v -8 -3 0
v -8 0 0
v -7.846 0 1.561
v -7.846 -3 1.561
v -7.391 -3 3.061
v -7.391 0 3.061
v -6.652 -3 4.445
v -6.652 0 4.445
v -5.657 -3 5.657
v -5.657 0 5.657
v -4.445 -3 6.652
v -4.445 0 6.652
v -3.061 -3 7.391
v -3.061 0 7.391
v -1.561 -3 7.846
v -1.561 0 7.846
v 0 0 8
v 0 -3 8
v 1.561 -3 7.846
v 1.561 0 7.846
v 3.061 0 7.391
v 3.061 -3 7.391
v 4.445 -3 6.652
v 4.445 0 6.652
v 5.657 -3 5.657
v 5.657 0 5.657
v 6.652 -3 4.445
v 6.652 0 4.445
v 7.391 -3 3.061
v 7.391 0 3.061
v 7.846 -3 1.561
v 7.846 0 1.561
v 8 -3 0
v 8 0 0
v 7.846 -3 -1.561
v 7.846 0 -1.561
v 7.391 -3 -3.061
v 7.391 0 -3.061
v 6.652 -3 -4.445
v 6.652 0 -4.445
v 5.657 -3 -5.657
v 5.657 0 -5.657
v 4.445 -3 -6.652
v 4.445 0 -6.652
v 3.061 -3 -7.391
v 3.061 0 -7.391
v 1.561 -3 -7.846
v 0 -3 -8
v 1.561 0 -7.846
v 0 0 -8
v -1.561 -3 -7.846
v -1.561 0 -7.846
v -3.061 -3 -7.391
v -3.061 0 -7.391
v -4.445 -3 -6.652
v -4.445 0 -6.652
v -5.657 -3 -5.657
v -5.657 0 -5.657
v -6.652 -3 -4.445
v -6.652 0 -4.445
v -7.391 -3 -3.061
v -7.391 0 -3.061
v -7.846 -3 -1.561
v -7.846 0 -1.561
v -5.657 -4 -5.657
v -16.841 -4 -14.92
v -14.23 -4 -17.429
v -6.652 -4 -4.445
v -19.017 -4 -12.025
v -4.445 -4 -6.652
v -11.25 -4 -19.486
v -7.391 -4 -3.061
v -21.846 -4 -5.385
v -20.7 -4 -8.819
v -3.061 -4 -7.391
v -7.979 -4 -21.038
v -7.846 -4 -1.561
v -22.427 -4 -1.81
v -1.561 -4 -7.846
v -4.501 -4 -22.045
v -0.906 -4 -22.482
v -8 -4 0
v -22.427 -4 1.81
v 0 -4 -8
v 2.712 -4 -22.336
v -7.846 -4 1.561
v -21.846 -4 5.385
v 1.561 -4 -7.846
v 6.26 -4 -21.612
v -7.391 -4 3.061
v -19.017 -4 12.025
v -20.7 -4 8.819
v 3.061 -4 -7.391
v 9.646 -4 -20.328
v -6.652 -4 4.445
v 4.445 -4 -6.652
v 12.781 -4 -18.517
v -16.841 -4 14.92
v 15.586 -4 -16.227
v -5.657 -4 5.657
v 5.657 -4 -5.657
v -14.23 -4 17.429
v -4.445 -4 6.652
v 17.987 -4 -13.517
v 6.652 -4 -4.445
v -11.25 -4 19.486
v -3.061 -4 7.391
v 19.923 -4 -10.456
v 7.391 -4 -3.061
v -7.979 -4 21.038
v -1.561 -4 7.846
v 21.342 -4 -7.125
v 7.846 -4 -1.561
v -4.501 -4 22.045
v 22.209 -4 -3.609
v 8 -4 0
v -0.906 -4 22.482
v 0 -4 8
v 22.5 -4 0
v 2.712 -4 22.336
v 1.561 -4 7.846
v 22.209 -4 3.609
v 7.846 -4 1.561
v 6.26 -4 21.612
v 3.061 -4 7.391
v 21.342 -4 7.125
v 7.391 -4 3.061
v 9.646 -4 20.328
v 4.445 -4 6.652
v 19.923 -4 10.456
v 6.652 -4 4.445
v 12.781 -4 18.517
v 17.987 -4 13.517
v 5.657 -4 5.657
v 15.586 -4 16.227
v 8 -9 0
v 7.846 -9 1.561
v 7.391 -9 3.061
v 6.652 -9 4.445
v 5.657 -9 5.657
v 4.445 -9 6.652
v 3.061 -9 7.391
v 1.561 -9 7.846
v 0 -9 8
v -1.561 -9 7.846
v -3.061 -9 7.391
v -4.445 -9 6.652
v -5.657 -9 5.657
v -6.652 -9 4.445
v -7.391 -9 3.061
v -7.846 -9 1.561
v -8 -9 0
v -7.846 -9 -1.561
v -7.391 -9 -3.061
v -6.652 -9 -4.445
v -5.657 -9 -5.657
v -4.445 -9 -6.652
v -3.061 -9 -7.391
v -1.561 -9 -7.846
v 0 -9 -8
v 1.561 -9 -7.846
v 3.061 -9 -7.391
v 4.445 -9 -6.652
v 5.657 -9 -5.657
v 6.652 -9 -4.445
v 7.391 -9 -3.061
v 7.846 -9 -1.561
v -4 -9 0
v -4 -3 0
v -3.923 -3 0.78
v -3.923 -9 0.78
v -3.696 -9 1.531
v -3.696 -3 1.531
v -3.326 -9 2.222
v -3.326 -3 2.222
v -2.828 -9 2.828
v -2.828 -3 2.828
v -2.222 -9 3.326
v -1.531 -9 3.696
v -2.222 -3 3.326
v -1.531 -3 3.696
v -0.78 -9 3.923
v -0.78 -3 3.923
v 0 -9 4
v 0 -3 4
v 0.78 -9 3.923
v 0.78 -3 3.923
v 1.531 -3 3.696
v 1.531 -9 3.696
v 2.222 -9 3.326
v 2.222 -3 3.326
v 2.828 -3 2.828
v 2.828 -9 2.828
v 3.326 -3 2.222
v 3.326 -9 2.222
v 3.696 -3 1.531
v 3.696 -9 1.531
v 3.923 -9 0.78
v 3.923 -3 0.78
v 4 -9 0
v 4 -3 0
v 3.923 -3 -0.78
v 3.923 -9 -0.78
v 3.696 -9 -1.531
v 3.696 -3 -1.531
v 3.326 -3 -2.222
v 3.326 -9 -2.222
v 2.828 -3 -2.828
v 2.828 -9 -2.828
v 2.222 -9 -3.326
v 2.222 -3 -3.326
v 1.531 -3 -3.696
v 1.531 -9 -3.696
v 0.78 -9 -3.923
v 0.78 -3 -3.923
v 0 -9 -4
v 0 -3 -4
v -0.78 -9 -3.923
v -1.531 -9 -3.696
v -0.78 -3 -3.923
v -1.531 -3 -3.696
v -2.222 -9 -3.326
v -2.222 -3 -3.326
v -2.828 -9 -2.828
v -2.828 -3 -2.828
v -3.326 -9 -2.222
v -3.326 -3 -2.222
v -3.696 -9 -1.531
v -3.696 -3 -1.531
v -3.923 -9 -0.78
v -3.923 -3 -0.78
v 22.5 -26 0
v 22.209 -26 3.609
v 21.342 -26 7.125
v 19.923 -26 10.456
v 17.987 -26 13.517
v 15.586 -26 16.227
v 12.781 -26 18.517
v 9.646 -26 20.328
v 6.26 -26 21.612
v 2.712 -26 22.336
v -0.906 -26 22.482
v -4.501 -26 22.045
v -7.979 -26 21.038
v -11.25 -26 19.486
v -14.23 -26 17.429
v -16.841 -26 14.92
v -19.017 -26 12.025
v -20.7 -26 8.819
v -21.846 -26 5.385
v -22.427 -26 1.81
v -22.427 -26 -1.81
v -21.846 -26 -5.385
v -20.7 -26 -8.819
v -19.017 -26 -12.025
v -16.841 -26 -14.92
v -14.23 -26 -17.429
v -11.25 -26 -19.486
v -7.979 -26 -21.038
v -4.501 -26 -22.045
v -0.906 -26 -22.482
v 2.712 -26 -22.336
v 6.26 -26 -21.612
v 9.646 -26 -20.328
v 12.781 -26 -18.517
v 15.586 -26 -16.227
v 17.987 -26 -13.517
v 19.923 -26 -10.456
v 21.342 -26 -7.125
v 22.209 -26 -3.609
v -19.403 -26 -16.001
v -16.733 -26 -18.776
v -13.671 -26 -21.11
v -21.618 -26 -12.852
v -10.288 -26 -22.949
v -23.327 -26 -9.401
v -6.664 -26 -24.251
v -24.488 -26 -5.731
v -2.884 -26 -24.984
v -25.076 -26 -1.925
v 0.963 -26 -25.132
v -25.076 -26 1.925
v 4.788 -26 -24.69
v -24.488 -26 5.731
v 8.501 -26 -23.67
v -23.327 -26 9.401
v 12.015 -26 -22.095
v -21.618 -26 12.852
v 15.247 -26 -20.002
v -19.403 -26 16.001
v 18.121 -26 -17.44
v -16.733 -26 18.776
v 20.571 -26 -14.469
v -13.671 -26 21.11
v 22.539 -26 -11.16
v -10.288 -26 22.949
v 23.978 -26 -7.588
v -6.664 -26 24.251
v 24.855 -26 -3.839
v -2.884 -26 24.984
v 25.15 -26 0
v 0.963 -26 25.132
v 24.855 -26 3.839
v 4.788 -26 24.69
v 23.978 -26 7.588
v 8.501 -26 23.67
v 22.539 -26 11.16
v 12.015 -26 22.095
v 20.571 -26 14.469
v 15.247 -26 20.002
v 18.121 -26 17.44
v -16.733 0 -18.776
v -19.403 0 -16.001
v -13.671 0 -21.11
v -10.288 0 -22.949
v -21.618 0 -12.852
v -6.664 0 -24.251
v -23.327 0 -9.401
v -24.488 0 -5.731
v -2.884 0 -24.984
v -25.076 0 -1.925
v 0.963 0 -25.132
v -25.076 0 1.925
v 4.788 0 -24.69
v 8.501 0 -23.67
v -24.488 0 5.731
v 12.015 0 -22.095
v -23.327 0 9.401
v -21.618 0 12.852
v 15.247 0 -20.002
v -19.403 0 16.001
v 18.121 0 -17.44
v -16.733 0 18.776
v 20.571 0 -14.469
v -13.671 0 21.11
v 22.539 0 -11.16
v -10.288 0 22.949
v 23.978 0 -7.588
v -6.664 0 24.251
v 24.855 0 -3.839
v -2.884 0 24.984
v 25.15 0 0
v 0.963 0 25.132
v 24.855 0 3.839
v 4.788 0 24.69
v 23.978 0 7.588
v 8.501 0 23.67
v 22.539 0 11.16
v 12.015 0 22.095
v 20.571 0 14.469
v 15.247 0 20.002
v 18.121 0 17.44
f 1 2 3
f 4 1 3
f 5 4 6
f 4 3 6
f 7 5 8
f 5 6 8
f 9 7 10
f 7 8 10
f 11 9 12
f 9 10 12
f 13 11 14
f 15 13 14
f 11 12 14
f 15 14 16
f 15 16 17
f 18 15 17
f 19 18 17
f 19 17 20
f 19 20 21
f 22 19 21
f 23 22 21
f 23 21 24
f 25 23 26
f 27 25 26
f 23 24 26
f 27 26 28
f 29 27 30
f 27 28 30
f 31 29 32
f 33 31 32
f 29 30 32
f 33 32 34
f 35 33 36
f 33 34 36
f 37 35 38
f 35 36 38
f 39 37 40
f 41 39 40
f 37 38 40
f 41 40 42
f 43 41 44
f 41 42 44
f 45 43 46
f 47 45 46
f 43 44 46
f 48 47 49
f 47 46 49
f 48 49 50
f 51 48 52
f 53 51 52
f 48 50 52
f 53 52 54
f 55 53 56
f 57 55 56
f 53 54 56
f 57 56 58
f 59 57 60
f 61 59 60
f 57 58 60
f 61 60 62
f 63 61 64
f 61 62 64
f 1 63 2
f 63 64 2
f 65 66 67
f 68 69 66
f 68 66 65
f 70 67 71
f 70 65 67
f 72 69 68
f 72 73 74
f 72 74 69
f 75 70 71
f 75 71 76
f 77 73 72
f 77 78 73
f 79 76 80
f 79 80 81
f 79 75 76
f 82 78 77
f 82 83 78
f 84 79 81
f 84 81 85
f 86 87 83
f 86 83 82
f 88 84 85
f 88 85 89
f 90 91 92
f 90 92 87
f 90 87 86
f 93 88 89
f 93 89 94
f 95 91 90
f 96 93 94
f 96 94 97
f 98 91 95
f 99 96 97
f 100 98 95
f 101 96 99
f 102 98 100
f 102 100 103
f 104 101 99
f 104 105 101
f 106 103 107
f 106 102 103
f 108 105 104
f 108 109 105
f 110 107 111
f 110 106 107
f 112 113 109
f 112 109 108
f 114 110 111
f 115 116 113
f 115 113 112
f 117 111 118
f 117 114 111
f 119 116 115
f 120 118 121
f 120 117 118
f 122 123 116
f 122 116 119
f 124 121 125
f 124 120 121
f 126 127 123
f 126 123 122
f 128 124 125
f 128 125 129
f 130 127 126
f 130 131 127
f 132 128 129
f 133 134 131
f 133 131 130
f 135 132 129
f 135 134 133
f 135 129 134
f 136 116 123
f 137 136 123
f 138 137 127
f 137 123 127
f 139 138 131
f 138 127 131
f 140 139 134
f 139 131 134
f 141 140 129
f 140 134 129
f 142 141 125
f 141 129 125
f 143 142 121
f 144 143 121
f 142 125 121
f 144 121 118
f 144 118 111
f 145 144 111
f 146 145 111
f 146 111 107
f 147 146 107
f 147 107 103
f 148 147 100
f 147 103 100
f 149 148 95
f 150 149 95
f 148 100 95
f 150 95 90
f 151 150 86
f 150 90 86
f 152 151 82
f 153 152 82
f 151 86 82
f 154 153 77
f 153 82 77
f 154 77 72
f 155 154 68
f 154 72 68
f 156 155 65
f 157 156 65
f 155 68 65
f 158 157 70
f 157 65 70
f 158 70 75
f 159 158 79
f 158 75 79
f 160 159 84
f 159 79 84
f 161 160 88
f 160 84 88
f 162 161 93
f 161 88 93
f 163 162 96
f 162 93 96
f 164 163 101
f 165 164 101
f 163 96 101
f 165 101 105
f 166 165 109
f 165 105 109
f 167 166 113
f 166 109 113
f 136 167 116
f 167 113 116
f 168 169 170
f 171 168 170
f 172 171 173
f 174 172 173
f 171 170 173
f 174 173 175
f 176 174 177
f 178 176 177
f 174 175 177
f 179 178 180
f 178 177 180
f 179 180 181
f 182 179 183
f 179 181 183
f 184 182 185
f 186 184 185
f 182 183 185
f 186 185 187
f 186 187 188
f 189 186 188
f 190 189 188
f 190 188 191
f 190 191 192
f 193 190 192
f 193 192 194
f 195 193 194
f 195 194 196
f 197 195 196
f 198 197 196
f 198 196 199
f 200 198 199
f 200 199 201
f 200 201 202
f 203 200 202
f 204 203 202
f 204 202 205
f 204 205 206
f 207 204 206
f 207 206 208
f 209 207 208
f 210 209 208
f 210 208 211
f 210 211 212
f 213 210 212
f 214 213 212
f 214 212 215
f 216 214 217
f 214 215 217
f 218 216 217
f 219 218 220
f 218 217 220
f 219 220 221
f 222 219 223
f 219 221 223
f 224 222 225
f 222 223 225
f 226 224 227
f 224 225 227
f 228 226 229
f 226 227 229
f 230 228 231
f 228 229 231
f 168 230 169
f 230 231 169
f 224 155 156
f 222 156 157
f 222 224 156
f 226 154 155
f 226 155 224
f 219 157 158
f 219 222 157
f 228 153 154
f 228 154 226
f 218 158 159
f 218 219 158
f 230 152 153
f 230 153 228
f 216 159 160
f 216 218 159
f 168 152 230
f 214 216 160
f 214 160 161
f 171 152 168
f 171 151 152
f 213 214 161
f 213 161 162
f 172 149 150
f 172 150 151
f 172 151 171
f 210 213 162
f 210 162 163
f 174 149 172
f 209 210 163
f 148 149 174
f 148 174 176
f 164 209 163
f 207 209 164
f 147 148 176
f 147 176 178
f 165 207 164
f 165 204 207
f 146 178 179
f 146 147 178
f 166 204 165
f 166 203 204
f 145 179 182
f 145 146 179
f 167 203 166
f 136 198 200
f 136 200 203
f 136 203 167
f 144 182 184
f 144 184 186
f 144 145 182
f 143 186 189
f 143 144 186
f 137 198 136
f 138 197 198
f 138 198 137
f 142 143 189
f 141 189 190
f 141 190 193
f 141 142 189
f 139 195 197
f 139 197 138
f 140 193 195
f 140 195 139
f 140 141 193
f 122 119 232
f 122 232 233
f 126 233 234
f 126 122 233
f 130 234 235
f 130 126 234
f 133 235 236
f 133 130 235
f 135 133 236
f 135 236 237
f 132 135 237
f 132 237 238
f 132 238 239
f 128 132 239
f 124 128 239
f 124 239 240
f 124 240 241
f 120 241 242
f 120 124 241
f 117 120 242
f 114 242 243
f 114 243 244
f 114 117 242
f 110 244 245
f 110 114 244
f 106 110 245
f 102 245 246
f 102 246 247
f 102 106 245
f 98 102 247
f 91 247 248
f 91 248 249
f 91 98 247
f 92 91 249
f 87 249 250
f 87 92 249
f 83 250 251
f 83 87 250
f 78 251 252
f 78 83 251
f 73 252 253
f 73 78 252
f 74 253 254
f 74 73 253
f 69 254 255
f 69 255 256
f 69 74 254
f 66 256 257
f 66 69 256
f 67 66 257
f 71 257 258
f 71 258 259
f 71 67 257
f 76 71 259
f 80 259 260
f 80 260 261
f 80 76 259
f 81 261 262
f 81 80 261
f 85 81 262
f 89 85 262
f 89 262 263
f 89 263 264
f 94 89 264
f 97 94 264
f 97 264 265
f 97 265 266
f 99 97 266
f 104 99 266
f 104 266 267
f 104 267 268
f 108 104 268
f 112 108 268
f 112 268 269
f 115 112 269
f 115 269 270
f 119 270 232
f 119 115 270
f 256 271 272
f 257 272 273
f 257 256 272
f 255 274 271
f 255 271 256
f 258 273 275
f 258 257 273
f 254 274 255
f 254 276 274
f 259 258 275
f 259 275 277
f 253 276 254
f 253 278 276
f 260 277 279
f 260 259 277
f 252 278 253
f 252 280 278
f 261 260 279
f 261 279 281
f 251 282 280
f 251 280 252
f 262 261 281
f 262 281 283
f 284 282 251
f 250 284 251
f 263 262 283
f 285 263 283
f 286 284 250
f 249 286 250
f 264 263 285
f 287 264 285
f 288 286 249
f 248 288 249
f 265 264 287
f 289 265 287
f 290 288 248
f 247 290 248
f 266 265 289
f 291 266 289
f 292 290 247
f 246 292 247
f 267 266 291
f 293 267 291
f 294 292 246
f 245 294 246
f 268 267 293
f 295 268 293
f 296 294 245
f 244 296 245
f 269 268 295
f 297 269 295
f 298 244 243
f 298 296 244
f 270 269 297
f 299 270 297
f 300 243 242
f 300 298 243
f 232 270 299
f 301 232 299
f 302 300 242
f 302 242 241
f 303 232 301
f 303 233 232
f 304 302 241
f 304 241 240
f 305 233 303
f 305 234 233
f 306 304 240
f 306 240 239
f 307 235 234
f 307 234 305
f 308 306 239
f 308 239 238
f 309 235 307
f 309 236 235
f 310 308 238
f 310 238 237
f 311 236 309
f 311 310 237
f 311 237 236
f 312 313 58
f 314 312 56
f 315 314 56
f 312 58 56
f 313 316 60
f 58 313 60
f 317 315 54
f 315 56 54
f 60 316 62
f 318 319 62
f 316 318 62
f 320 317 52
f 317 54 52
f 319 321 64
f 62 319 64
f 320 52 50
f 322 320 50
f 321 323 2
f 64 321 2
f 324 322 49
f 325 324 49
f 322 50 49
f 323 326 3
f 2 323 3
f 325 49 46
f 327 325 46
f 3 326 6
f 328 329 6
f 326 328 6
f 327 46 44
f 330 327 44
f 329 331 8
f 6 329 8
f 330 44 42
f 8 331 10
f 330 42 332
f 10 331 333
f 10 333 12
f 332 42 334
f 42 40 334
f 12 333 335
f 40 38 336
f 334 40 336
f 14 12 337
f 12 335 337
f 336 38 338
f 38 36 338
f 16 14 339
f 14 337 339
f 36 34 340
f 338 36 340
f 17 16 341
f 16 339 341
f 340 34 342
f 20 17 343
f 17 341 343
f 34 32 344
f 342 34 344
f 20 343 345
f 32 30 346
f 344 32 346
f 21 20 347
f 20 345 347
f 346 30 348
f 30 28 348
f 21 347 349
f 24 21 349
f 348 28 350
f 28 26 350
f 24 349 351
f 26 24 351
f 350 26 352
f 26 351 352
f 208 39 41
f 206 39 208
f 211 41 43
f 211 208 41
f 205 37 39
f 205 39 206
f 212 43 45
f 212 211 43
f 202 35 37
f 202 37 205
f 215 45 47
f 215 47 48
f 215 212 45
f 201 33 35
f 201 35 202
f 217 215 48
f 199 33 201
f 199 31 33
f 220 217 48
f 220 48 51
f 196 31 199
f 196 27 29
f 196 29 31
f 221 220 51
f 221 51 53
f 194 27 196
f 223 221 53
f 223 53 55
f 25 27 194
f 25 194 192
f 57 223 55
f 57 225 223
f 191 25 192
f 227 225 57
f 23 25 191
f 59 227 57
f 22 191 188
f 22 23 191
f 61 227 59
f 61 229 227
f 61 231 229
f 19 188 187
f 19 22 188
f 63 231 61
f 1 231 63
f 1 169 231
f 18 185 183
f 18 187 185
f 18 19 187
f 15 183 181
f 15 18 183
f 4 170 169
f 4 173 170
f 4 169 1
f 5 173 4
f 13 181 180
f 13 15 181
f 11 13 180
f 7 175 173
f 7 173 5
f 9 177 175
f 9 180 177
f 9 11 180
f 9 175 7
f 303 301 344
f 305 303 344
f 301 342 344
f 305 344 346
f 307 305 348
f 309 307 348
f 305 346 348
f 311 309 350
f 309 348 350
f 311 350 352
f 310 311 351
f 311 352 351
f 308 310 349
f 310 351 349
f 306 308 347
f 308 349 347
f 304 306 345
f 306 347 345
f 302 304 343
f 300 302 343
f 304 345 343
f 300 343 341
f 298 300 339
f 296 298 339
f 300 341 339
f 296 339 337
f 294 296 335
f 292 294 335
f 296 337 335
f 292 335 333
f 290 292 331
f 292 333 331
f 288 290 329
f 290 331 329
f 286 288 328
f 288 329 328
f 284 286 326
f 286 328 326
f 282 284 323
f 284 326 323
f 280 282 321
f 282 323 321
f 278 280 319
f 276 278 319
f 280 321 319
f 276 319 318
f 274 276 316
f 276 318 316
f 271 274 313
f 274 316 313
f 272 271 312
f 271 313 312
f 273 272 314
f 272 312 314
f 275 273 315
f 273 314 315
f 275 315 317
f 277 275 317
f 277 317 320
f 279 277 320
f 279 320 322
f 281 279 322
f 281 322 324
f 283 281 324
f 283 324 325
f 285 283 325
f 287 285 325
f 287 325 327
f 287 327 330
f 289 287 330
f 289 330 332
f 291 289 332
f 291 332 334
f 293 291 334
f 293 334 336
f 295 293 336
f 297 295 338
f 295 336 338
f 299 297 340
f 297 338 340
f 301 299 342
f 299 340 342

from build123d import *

# Parameters (mm, degrees)
F0_R     = 25.15
F1_DEPTH = 4
F2_R     = 25.15
F2_R_2   = 22.5
F3_DEPTH = 22
F4_R     = 8
F5_DEPTH = 5
F6_R     = 4
F7_DEPTH = 25
F8_R     = 8
F9_DEPTH = 3


with BuildPart() as f1:
    # F0 (on Front) → F1 (new body)
    with BuildSketch(Plane.XZ):
        Circle(F0_R)
    extrude(amount=F1_DEPTH)

    # F2 (on face) → F3 (join)
    with BuildSketch(Plane.XZ.offset(4)):
        Circle(F2_R)
        Circle(F2_R_2, mode=Mode.SUBTRACT)
    extrude(amount=F3_DEPTH)

    # F4 (on face) → F5 (join)
    with BuildSketch(Plane.XZ.offset(4)):
        Circle(F4_R)
    extrude(amount=F5_DEPTH)

    # F6 (on face) → F7 (cut)
    with BuildSketch(Plane(origin=(0, 0, 0), x_dir=(-1, 0, 0), z_dir=(0, 1, 0))):
        Circle(F6_R)
    extrude(amount=-F7_DEPTH, mode=Mode.SUBTRACT)

    # F8 (on face) → F9 (cut)
    with BuildSketch(Plane(origin=(0, 0, 0), x_dir=(-1, 0, 0), z_dir=(0, 1, 0))):
        Circle(F8_R)
    extrude(amount=-F9_DEPTH, mode=Mode.SUBTRACT)


solid = f1.part
